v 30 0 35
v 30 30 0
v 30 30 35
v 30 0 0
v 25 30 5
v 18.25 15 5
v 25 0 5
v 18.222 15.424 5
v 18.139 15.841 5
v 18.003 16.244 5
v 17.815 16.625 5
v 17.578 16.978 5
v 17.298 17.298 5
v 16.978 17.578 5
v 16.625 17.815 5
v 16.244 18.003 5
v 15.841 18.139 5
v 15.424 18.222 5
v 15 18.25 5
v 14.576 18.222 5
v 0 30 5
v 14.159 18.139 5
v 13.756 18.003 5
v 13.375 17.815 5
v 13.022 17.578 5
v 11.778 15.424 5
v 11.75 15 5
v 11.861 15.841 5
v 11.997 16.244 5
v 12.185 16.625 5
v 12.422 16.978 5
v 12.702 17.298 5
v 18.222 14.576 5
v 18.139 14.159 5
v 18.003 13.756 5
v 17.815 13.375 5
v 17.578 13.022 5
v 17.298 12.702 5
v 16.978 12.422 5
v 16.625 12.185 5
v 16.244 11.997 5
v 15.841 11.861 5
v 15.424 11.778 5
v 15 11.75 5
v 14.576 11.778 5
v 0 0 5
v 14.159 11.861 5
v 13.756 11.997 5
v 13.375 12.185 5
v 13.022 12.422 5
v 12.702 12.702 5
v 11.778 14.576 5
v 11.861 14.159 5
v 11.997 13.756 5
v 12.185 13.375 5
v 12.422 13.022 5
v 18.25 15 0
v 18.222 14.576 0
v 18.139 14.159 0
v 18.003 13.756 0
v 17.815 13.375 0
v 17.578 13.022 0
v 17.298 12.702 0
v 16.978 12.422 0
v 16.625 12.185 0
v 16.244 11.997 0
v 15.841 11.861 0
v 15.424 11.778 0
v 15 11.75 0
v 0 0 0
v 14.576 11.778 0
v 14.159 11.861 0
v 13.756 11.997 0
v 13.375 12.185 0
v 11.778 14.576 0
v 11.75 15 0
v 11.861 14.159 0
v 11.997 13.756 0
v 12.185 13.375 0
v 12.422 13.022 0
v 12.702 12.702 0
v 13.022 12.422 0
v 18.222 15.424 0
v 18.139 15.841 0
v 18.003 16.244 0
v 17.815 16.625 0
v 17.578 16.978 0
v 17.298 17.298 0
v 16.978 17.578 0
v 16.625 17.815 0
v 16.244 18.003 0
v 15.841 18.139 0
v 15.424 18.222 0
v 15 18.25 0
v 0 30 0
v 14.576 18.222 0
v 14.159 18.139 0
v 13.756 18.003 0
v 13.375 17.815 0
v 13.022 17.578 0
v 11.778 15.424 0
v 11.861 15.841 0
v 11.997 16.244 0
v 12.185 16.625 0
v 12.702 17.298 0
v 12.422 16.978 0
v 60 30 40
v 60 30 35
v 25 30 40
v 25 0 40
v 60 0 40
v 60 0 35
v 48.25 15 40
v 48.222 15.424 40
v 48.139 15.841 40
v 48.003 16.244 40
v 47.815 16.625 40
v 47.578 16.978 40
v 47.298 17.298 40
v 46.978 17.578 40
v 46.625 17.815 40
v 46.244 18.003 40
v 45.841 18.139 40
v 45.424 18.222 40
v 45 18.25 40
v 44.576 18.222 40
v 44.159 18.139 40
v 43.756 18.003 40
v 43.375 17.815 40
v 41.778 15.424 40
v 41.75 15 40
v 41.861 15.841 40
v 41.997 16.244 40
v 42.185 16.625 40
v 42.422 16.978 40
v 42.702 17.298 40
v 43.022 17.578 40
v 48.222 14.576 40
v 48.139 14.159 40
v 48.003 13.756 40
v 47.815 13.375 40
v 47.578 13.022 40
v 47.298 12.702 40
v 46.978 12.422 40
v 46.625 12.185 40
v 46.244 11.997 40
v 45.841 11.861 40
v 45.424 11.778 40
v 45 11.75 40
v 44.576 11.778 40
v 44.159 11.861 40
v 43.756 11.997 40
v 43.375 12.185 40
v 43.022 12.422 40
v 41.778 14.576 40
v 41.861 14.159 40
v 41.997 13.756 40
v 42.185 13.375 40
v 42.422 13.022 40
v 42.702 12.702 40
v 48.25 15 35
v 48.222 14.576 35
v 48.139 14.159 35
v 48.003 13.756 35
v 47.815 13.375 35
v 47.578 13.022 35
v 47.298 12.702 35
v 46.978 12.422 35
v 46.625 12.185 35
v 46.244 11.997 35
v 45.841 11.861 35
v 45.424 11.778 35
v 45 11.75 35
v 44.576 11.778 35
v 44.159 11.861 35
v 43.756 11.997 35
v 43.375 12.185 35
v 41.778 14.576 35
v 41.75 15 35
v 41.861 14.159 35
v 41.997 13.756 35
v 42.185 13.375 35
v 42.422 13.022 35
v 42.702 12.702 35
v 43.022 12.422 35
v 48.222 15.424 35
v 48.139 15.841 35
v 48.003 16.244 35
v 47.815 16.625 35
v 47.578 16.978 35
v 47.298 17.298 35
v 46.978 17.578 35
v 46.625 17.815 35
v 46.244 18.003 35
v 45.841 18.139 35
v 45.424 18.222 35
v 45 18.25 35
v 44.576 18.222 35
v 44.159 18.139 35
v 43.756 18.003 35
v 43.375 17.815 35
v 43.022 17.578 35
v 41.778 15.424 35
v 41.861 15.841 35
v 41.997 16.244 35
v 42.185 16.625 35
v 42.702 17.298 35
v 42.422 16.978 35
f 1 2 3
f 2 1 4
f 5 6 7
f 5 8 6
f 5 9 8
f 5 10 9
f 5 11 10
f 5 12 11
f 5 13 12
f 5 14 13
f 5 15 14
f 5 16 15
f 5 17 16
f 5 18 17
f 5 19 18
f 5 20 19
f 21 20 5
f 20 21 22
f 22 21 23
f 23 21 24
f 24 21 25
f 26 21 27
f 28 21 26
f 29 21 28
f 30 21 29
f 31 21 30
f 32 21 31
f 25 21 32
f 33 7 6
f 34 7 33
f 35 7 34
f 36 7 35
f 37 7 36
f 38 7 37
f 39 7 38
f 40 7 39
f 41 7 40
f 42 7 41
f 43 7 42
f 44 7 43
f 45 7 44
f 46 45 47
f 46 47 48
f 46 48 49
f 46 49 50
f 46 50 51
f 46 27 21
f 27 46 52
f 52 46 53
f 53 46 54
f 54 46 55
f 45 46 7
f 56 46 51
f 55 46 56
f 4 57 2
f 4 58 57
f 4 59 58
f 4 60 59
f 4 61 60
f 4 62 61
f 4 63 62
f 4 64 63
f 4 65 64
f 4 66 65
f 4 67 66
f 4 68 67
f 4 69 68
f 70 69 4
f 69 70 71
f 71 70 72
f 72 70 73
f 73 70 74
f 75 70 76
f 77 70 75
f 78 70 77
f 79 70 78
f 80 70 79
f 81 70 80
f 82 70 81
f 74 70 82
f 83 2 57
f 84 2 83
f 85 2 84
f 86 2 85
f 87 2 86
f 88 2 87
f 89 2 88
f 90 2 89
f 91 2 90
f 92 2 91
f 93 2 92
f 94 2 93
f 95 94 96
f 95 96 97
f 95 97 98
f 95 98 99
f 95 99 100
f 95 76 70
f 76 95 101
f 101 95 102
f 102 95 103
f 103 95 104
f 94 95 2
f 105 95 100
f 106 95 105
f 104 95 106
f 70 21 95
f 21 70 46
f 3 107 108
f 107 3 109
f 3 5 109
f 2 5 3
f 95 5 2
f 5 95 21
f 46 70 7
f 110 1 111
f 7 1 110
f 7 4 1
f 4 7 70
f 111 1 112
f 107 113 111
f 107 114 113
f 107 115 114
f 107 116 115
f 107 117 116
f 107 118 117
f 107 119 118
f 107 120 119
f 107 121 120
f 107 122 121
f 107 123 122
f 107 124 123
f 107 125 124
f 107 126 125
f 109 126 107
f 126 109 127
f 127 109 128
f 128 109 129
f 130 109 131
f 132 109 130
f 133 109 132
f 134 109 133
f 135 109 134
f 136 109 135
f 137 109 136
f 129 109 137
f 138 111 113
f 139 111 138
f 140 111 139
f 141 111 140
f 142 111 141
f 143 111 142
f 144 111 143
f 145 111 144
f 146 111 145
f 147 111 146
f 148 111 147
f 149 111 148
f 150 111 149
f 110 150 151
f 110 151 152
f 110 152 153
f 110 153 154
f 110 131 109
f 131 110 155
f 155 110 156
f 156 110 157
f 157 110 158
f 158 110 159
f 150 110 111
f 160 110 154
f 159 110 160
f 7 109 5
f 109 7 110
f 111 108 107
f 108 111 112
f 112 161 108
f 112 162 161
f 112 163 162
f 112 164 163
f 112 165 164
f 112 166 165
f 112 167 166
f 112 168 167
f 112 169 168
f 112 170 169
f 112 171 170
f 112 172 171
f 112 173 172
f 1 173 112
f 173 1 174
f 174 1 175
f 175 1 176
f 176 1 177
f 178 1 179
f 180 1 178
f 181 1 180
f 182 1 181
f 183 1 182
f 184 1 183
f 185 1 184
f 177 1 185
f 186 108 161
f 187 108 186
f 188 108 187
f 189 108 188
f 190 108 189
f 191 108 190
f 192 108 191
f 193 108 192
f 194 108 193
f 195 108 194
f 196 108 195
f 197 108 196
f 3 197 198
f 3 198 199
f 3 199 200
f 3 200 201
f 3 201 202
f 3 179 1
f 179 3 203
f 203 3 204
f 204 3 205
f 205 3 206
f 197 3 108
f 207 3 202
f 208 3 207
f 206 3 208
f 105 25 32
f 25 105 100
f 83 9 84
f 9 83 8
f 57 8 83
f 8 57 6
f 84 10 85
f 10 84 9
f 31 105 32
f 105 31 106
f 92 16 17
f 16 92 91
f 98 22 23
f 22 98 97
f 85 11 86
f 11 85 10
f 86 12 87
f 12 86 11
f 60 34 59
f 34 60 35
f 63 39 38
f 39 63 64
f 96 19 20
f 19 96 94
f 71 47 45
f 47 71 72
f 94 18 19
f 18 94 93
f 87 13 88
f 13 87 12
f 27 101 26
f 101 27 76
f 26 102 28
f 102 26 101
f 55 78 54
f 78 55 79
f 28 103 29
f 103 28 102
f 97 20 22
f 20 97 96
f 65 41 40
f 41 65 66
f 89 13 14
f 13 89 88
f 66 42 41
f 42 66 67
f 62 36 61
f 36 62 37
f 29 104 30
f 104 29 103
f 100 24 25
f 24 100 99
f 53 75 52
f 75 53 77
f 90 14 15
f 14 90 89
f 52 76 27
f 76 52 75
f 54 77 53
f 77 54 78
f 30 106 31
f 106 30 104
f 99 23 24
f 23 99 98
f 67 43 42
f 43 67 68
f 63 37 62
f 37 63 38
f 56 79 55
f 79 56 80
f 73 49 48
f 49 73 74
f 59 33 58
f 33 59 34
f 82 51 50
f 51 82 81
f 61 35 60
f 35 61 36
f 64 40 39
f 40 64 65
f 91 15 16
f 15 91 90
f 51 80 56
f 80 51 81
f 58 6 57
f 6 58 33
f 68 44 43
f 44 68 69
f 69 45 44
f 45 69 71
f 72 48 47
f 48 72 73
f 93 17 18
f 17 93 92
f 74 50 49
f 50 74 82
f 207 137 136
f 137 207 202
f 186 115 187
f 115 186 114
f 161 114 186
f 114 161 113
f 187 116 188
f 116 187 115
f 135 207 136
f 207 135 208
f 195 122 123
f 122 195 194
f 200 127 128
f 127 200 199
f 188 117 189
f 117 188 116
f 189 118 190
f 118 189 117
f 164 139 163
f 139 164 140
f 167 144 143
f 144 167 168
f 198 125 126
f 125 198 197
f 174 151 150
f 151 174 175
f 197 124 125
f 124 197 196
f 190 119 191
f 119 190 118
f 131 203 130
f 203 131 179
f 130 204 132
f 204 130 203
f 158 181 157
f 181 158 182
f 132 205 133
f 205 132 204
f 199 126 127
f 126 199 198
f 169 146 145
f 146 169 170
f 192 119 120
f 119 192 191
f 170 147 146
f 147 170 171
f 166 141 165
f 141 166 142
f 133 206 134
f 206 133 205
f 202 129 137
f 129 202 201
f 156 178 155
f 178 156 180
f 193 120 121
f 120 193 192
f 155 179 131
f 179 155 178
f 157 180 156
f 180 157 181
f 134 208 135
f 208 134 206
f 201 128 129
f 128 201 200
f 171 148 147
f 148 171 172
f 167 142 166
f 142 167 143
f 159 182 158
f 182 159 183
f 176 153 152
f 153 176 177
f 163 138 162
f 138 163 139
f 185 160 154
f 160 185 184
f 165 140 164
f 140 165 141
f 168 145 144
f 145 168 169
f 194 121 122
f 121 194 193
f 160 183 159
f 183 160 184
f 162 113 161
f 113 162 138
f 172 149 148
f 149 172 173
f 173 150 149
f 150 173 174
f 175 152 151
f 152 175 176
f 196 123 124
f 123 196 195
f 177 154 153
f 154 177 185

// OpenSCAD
// Z-bracket for mounting a framed solar panel to a roof, rack or wall. CC0.
// frame = panel frame thickness (30, 35 or 40 mm are common). Print 4, PETG/ASA, 100% infill.
frame = 35; wid = 30; thick = 5; flange = 30; bolt = 6.5;
$fn = 48;
difference() {
  union() {
    cube([flange, wid, thick]);                                  // panel side
    translate([flange - thick, 0, 0]) cube([thick, wid, frame + thick]);
    translate([flange - thick, 0, frame]) cube([flange + thick, wid, thick]);  // rack side
  }
  translate([flange / 2, wid / 2, -1]) cylinder(d = bolt, h = thick + 2);
  translate([flange + flange / 2, wid / 2, frame - 1]) cylinder(d = bolt, h = thick + 2);
}
